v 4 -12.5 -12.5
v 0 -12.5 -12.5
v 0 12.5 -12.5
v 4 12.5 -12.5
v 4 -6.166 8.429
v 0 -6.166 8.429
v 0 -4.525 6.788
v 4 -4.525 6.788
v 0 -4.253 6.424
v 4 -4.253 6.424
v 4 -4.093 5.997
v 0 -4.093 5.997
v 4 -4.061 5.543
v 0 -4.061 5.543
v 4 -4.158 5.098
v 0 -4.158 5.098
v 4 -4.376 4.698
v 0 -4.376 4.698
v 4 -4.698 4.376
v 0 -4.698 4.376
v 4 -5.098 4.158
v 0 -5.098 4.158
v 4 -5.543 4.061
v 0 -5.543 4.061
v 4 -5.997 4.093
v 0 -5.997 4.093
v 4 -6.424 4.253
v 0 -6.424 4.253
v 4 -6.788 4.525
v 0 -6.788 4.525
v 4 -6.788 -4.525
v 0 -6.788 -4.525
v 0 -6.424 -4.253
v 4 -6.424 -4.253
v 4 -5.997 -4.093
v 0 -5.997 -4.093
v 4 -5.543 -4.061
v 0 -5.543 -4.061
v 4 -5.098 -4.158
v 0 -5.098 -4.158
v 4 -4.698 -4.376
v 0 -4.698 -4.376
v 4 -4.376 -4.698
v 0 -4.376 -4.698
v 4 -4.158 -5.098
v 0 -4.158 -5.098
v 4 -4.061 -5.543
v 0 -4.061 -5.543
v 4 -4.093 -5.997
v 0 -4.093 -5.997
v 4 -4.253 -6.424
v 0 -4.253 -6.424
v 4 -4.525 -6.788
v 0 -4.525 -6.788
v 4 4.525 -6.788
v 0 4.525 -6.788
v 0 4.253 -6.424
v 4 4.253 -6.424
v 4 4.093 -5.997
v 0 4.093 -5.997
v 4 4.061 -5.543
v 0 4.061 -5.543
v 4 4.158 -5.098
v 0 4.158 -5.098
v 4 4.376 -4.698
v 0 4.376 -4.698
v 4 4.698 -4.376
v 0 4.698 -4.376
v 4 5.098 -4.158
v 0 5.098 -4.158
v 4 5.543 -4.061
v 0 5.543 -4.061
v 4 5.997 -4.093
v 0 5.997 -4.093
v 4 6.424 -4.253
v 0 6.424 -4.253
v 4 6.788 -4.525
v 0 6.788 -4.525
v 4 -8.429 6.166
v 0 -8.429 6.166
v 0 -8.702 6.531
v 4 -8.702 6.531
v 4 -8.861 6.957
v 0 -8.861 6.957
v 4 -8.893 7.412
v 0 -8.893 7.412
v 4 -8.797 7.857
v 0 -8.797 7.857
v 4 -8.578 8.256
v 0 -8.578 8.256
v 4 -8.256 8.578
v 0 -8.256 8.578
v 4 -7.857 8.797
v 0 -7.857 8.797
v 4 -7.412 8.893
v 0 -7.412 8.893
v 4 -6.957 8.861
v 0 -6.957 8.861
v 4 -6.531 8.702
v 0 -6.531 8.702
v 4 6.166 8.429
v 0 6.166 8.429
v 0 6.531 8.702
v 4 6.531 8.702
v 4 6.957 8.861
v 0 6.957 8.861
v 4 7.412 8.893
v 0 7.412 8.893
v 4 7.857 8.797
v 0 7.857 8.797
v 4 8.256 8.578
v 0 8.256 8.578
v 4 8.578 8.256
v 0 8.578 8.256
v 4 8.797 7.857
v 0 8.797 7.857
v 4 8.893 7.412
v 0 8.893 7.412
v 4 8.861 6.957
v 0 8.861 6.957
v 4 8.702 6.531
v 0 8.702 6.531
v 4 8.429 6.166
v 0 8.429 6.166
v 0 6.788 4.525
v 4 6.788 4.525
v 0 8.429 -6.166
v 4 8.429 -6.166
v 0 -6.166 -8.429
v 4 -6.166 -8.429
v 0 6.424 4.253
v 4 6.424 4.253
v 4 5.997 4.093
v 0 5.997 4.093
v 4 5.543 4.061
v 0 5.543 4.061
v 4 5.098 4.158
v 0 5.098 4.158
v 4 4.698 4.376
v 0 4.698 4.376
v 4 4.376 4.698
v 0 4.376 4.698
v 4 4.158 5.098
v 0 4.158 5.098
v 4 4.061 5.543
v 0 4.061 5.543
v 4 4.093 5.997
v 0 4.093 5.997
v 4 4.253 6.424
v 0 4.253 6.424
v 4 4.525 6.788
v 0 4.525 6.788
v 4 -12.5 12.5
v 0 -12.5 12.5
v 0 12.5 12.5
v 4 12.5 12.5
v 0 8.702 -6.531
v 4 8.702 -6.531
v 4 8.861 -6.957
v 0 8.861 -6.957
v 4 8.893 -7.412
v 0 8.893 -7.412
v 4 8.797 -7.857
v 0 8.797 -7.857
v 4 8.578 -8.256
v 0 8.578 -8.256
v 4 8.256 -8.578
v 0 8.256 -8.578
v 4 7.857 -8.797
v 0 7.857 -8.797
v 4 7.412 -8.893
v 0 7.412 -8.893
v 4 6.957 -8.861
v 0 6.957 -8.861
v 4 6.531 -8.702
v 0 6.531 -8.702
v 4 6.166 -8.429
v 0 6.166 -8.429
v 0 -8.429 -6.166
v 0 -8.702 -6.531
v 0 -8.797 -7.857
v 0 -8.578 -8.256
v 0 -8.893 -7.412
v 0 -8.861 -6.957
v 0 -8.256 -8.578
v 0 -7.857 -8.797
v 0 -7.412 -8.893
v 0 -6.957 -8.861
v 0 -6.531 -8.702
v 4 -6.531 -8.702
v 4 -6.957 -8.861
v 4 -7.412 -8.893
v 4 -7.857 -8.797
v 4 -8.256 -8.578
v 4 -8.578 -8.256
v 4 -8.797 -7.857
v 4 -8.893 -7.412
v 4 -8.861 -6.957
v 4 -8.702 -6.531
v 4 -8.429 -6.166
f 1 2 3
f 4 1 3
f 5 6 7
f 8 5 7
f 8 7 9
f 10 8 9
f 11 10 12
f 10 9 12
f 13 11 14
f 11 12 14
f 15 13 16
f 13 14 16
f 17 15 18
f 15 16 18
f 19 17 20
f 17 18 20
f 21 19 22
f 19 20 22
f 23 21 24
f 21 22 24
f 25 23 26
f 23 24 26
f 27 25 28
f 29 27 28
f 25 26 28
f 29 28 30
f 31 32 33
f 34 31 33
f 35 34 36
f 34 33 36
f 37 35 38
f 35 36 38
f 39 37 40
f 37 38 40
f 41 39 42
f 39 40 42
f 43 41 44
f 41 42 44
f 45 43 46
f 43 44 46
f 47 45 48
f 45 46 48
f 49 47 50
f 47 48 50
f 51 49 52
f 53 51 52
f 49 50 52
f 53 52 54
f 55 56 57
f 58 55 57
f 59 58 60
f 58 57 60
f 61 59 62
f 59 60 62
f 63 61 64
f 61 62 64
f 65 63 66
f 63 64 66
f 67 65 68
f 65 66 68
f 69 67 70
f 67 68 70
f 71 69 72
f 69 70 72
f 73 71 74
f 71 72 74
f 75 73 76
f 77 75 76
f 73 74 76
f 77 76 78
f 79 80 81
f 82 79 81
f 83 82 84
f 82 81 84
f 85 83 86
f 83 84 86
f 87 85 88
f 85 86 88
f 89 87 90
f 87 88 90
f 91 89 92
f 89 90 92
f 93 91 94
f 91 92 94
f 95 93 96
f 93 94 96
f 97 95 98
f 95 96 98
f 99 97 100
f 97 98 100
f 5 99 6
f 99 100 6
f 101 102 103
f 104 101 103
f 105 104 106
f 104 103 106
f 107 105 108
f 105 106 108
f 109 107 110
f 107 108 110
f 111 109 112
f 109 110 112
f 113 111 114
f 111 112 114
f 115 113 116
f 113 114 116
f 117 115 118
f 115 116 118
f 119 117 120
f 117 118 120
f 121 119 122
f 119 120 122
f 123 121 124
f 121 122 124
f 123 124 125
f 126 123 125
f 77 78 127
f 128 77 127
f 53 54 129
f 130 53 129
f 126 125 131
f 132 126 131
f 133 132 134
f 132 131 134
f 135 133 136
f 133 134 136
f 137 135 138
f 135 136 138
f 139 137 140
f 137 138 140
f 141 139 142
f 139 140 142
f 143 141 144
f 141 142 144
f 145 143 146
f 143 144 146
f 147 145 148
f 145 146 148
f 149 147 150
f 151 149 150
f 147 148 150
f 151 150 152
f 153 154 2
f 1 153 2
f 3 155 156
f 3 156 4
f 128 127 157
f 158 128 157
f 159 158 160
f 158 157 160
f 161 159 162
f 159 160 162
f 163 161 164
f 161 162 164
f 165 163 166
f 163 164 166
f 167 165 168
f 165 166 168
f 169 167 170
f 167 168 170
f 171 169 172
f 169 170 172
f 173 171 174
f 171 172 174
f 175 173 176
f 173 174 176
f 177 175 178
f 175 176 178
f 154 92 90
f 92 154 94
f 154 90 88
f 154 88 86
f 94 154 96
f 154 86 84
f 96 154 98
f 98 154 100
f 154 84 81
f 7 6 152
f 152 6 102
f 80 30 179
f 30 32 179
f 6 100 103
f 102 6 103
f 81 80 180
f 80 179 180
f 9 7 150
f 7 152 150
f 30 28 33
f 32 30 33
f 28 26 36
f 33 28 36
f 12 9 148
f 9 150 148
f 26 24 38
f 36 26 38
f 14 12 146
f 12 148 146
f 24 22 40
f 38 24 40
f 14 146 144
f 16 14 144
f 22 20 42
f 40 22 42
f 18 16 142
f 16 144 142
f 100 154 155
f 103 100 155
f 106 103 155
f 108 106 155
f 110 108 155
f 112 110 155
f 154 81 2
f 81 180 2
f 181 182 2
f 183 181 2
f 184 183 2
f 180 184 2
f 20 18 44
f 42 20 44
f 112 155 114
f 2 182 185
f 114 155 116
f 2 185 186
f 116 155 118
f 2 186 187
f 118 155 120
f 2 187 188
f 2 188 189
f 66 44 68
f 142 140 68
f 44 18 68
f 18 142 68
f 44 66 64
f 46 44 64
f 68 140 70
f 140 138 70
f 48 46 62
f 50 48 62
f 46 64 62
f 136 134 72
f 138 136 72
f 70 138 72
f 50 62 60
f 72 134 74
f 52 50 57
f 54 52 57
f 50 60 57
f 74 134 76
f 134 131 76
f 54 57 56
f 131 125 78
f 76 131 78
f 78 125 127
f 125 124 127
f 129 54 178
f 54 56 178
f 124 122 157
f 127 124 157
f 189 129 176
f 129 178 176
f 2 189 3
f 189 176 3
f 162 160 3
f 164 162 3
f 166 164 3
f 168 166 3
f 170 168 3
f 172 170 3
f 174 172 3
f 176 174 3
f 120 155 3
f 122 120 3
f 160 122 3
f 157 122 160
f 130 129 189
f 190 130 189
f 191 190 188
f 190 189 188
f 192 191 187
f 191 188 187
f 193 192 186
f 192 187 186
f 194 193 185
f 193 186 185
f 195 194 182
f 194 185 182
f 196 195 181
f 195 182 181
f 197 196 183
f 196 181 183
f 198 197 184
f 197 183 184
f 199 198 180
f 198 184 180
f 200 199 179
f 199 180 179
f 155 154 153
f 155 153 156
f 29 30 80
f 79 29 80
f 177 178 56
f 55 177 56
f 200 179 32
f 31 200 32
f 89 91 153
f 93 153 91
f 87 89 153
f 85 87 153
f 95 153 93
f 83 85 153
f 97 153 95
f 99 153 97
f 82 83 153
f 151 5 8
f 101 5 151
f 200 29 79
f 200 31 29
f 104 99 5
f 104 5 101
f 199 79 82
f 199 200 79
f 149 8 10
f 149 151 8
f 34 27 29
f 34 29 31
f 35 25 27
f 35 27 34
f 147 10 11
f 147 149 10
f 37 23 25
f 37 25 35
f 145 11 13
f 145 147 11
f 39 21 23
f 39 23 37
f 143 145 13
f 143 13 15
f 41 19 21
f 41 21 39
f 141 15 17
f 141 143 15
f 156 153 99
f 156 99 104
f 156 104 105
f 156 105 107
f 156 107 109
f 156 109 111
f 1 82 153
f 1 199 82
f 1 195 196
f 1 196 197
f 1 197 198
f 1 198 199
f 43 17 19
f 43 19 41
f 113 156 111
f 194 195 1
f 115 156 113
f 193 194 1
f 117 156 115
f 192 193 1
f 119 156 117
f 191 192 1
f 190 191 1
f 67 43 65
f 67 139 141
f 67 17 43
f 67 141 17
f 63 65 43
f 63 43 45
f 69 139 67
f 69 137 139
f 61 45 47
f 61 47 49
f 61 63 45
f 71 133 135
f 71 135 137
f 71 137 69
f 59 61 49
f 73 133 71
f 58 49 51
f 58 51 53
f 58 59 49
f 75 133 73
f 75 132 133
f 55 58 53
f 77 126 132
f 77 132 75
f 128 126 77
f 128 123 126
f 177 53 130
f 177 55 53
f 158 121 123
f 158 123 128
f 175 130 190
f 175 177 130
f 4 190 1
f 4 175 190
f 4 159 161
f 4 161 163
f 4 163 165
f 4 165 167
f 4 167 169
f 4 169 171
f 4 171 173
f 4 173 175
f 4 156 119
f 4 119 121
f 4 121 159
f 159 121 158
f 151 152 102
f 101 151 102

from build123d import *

# Parameters (mm, degrees)
SKETCH2_W           = 25
SKETCH2_H           = 25
BOSS_EXTRUDE1_DEPTH = 4


with BuildPart() as part:
    # Sketch2 → Boss-Extrude1 (new body)
    with BuildSketch(Plane(origin=(0, 0, 0), x_dir=(0, 0, -1), z_dir=(1, 0, 0))):
        Rectangle(SKETCH2_W, SKETCH2_H)
        with BuildLine():
            Line((-4.5254834, -6.788225099), (-6.166074019, -8.428815718))
            ThreePointArc((-6.166074019, -8.428815718), (-8.428815718, -8.428815718), (-8.428815718, -6.166074019))
            Line((-8.428815718, -6.166074019), (-6.788225099, -4.5254834))
            ThreePointArc((-6.788225099, -4.5254834), (-4.5254834, -4.5254834), (-4.5254834, -6.788225099))
        make_face(mode=Mode.SUBTRACT)
        with BuildLine():
            Line((6.788225099, -4.5254834), (8.428815718, -6.166074019))
            ThreePointArc((8.428815718, -6.166074019), (8.428815718, -8.428815718), (6.166074019, -8.428815718))
            Line((6.166074019, -8.428815718), (4.5254834, -6.788225099))
            ThreePointArc((4.5254834, -6.788225099), (4.5254834, -4.5254834), (6.788225099, -4.5254834))
        make_face(mode=Mode.SUBTRACT)
        with BuildLine():
            Line((-6.788225099, 4.5254834), (-8.428815718, 6.166074019))
            ThreePointArc((-8.428815718, 6.166074019), (-8.428815718, 8.428815718), (-6.166074019, 8.428815718))
            Line((-6.166074019, 8.428815718), (-4.5254834, 6.788225099))
            ThreePointArc((-4.5254834, 6.788225099), (-4.5254834, 4.5254834), (-6.788225099, 4.5254834))
        make_face(mode=Mode.SUBTRACT)
        with BuildLine():
            Line((4.5254834, 6.788225099), (6.166074019, 8.428815718))
            ThreePointArc((6.166074019, 8.428815718), (8.428815718, 8.428815718), (8.428815718, 6.166074019))
            Line((8.428815718, 6.166074019), (6.788225099, 4.5254834))
            ThreePointArc((6.788225099, 4.5254834), (4.5254834, 4.5254834), (4.5254834, 6.788225099))
        make_face(mode=Mode.SUBTRACT)
    extrude(amount=BOSS_EXTRUDE1_DEPTH)


solid = part.part
